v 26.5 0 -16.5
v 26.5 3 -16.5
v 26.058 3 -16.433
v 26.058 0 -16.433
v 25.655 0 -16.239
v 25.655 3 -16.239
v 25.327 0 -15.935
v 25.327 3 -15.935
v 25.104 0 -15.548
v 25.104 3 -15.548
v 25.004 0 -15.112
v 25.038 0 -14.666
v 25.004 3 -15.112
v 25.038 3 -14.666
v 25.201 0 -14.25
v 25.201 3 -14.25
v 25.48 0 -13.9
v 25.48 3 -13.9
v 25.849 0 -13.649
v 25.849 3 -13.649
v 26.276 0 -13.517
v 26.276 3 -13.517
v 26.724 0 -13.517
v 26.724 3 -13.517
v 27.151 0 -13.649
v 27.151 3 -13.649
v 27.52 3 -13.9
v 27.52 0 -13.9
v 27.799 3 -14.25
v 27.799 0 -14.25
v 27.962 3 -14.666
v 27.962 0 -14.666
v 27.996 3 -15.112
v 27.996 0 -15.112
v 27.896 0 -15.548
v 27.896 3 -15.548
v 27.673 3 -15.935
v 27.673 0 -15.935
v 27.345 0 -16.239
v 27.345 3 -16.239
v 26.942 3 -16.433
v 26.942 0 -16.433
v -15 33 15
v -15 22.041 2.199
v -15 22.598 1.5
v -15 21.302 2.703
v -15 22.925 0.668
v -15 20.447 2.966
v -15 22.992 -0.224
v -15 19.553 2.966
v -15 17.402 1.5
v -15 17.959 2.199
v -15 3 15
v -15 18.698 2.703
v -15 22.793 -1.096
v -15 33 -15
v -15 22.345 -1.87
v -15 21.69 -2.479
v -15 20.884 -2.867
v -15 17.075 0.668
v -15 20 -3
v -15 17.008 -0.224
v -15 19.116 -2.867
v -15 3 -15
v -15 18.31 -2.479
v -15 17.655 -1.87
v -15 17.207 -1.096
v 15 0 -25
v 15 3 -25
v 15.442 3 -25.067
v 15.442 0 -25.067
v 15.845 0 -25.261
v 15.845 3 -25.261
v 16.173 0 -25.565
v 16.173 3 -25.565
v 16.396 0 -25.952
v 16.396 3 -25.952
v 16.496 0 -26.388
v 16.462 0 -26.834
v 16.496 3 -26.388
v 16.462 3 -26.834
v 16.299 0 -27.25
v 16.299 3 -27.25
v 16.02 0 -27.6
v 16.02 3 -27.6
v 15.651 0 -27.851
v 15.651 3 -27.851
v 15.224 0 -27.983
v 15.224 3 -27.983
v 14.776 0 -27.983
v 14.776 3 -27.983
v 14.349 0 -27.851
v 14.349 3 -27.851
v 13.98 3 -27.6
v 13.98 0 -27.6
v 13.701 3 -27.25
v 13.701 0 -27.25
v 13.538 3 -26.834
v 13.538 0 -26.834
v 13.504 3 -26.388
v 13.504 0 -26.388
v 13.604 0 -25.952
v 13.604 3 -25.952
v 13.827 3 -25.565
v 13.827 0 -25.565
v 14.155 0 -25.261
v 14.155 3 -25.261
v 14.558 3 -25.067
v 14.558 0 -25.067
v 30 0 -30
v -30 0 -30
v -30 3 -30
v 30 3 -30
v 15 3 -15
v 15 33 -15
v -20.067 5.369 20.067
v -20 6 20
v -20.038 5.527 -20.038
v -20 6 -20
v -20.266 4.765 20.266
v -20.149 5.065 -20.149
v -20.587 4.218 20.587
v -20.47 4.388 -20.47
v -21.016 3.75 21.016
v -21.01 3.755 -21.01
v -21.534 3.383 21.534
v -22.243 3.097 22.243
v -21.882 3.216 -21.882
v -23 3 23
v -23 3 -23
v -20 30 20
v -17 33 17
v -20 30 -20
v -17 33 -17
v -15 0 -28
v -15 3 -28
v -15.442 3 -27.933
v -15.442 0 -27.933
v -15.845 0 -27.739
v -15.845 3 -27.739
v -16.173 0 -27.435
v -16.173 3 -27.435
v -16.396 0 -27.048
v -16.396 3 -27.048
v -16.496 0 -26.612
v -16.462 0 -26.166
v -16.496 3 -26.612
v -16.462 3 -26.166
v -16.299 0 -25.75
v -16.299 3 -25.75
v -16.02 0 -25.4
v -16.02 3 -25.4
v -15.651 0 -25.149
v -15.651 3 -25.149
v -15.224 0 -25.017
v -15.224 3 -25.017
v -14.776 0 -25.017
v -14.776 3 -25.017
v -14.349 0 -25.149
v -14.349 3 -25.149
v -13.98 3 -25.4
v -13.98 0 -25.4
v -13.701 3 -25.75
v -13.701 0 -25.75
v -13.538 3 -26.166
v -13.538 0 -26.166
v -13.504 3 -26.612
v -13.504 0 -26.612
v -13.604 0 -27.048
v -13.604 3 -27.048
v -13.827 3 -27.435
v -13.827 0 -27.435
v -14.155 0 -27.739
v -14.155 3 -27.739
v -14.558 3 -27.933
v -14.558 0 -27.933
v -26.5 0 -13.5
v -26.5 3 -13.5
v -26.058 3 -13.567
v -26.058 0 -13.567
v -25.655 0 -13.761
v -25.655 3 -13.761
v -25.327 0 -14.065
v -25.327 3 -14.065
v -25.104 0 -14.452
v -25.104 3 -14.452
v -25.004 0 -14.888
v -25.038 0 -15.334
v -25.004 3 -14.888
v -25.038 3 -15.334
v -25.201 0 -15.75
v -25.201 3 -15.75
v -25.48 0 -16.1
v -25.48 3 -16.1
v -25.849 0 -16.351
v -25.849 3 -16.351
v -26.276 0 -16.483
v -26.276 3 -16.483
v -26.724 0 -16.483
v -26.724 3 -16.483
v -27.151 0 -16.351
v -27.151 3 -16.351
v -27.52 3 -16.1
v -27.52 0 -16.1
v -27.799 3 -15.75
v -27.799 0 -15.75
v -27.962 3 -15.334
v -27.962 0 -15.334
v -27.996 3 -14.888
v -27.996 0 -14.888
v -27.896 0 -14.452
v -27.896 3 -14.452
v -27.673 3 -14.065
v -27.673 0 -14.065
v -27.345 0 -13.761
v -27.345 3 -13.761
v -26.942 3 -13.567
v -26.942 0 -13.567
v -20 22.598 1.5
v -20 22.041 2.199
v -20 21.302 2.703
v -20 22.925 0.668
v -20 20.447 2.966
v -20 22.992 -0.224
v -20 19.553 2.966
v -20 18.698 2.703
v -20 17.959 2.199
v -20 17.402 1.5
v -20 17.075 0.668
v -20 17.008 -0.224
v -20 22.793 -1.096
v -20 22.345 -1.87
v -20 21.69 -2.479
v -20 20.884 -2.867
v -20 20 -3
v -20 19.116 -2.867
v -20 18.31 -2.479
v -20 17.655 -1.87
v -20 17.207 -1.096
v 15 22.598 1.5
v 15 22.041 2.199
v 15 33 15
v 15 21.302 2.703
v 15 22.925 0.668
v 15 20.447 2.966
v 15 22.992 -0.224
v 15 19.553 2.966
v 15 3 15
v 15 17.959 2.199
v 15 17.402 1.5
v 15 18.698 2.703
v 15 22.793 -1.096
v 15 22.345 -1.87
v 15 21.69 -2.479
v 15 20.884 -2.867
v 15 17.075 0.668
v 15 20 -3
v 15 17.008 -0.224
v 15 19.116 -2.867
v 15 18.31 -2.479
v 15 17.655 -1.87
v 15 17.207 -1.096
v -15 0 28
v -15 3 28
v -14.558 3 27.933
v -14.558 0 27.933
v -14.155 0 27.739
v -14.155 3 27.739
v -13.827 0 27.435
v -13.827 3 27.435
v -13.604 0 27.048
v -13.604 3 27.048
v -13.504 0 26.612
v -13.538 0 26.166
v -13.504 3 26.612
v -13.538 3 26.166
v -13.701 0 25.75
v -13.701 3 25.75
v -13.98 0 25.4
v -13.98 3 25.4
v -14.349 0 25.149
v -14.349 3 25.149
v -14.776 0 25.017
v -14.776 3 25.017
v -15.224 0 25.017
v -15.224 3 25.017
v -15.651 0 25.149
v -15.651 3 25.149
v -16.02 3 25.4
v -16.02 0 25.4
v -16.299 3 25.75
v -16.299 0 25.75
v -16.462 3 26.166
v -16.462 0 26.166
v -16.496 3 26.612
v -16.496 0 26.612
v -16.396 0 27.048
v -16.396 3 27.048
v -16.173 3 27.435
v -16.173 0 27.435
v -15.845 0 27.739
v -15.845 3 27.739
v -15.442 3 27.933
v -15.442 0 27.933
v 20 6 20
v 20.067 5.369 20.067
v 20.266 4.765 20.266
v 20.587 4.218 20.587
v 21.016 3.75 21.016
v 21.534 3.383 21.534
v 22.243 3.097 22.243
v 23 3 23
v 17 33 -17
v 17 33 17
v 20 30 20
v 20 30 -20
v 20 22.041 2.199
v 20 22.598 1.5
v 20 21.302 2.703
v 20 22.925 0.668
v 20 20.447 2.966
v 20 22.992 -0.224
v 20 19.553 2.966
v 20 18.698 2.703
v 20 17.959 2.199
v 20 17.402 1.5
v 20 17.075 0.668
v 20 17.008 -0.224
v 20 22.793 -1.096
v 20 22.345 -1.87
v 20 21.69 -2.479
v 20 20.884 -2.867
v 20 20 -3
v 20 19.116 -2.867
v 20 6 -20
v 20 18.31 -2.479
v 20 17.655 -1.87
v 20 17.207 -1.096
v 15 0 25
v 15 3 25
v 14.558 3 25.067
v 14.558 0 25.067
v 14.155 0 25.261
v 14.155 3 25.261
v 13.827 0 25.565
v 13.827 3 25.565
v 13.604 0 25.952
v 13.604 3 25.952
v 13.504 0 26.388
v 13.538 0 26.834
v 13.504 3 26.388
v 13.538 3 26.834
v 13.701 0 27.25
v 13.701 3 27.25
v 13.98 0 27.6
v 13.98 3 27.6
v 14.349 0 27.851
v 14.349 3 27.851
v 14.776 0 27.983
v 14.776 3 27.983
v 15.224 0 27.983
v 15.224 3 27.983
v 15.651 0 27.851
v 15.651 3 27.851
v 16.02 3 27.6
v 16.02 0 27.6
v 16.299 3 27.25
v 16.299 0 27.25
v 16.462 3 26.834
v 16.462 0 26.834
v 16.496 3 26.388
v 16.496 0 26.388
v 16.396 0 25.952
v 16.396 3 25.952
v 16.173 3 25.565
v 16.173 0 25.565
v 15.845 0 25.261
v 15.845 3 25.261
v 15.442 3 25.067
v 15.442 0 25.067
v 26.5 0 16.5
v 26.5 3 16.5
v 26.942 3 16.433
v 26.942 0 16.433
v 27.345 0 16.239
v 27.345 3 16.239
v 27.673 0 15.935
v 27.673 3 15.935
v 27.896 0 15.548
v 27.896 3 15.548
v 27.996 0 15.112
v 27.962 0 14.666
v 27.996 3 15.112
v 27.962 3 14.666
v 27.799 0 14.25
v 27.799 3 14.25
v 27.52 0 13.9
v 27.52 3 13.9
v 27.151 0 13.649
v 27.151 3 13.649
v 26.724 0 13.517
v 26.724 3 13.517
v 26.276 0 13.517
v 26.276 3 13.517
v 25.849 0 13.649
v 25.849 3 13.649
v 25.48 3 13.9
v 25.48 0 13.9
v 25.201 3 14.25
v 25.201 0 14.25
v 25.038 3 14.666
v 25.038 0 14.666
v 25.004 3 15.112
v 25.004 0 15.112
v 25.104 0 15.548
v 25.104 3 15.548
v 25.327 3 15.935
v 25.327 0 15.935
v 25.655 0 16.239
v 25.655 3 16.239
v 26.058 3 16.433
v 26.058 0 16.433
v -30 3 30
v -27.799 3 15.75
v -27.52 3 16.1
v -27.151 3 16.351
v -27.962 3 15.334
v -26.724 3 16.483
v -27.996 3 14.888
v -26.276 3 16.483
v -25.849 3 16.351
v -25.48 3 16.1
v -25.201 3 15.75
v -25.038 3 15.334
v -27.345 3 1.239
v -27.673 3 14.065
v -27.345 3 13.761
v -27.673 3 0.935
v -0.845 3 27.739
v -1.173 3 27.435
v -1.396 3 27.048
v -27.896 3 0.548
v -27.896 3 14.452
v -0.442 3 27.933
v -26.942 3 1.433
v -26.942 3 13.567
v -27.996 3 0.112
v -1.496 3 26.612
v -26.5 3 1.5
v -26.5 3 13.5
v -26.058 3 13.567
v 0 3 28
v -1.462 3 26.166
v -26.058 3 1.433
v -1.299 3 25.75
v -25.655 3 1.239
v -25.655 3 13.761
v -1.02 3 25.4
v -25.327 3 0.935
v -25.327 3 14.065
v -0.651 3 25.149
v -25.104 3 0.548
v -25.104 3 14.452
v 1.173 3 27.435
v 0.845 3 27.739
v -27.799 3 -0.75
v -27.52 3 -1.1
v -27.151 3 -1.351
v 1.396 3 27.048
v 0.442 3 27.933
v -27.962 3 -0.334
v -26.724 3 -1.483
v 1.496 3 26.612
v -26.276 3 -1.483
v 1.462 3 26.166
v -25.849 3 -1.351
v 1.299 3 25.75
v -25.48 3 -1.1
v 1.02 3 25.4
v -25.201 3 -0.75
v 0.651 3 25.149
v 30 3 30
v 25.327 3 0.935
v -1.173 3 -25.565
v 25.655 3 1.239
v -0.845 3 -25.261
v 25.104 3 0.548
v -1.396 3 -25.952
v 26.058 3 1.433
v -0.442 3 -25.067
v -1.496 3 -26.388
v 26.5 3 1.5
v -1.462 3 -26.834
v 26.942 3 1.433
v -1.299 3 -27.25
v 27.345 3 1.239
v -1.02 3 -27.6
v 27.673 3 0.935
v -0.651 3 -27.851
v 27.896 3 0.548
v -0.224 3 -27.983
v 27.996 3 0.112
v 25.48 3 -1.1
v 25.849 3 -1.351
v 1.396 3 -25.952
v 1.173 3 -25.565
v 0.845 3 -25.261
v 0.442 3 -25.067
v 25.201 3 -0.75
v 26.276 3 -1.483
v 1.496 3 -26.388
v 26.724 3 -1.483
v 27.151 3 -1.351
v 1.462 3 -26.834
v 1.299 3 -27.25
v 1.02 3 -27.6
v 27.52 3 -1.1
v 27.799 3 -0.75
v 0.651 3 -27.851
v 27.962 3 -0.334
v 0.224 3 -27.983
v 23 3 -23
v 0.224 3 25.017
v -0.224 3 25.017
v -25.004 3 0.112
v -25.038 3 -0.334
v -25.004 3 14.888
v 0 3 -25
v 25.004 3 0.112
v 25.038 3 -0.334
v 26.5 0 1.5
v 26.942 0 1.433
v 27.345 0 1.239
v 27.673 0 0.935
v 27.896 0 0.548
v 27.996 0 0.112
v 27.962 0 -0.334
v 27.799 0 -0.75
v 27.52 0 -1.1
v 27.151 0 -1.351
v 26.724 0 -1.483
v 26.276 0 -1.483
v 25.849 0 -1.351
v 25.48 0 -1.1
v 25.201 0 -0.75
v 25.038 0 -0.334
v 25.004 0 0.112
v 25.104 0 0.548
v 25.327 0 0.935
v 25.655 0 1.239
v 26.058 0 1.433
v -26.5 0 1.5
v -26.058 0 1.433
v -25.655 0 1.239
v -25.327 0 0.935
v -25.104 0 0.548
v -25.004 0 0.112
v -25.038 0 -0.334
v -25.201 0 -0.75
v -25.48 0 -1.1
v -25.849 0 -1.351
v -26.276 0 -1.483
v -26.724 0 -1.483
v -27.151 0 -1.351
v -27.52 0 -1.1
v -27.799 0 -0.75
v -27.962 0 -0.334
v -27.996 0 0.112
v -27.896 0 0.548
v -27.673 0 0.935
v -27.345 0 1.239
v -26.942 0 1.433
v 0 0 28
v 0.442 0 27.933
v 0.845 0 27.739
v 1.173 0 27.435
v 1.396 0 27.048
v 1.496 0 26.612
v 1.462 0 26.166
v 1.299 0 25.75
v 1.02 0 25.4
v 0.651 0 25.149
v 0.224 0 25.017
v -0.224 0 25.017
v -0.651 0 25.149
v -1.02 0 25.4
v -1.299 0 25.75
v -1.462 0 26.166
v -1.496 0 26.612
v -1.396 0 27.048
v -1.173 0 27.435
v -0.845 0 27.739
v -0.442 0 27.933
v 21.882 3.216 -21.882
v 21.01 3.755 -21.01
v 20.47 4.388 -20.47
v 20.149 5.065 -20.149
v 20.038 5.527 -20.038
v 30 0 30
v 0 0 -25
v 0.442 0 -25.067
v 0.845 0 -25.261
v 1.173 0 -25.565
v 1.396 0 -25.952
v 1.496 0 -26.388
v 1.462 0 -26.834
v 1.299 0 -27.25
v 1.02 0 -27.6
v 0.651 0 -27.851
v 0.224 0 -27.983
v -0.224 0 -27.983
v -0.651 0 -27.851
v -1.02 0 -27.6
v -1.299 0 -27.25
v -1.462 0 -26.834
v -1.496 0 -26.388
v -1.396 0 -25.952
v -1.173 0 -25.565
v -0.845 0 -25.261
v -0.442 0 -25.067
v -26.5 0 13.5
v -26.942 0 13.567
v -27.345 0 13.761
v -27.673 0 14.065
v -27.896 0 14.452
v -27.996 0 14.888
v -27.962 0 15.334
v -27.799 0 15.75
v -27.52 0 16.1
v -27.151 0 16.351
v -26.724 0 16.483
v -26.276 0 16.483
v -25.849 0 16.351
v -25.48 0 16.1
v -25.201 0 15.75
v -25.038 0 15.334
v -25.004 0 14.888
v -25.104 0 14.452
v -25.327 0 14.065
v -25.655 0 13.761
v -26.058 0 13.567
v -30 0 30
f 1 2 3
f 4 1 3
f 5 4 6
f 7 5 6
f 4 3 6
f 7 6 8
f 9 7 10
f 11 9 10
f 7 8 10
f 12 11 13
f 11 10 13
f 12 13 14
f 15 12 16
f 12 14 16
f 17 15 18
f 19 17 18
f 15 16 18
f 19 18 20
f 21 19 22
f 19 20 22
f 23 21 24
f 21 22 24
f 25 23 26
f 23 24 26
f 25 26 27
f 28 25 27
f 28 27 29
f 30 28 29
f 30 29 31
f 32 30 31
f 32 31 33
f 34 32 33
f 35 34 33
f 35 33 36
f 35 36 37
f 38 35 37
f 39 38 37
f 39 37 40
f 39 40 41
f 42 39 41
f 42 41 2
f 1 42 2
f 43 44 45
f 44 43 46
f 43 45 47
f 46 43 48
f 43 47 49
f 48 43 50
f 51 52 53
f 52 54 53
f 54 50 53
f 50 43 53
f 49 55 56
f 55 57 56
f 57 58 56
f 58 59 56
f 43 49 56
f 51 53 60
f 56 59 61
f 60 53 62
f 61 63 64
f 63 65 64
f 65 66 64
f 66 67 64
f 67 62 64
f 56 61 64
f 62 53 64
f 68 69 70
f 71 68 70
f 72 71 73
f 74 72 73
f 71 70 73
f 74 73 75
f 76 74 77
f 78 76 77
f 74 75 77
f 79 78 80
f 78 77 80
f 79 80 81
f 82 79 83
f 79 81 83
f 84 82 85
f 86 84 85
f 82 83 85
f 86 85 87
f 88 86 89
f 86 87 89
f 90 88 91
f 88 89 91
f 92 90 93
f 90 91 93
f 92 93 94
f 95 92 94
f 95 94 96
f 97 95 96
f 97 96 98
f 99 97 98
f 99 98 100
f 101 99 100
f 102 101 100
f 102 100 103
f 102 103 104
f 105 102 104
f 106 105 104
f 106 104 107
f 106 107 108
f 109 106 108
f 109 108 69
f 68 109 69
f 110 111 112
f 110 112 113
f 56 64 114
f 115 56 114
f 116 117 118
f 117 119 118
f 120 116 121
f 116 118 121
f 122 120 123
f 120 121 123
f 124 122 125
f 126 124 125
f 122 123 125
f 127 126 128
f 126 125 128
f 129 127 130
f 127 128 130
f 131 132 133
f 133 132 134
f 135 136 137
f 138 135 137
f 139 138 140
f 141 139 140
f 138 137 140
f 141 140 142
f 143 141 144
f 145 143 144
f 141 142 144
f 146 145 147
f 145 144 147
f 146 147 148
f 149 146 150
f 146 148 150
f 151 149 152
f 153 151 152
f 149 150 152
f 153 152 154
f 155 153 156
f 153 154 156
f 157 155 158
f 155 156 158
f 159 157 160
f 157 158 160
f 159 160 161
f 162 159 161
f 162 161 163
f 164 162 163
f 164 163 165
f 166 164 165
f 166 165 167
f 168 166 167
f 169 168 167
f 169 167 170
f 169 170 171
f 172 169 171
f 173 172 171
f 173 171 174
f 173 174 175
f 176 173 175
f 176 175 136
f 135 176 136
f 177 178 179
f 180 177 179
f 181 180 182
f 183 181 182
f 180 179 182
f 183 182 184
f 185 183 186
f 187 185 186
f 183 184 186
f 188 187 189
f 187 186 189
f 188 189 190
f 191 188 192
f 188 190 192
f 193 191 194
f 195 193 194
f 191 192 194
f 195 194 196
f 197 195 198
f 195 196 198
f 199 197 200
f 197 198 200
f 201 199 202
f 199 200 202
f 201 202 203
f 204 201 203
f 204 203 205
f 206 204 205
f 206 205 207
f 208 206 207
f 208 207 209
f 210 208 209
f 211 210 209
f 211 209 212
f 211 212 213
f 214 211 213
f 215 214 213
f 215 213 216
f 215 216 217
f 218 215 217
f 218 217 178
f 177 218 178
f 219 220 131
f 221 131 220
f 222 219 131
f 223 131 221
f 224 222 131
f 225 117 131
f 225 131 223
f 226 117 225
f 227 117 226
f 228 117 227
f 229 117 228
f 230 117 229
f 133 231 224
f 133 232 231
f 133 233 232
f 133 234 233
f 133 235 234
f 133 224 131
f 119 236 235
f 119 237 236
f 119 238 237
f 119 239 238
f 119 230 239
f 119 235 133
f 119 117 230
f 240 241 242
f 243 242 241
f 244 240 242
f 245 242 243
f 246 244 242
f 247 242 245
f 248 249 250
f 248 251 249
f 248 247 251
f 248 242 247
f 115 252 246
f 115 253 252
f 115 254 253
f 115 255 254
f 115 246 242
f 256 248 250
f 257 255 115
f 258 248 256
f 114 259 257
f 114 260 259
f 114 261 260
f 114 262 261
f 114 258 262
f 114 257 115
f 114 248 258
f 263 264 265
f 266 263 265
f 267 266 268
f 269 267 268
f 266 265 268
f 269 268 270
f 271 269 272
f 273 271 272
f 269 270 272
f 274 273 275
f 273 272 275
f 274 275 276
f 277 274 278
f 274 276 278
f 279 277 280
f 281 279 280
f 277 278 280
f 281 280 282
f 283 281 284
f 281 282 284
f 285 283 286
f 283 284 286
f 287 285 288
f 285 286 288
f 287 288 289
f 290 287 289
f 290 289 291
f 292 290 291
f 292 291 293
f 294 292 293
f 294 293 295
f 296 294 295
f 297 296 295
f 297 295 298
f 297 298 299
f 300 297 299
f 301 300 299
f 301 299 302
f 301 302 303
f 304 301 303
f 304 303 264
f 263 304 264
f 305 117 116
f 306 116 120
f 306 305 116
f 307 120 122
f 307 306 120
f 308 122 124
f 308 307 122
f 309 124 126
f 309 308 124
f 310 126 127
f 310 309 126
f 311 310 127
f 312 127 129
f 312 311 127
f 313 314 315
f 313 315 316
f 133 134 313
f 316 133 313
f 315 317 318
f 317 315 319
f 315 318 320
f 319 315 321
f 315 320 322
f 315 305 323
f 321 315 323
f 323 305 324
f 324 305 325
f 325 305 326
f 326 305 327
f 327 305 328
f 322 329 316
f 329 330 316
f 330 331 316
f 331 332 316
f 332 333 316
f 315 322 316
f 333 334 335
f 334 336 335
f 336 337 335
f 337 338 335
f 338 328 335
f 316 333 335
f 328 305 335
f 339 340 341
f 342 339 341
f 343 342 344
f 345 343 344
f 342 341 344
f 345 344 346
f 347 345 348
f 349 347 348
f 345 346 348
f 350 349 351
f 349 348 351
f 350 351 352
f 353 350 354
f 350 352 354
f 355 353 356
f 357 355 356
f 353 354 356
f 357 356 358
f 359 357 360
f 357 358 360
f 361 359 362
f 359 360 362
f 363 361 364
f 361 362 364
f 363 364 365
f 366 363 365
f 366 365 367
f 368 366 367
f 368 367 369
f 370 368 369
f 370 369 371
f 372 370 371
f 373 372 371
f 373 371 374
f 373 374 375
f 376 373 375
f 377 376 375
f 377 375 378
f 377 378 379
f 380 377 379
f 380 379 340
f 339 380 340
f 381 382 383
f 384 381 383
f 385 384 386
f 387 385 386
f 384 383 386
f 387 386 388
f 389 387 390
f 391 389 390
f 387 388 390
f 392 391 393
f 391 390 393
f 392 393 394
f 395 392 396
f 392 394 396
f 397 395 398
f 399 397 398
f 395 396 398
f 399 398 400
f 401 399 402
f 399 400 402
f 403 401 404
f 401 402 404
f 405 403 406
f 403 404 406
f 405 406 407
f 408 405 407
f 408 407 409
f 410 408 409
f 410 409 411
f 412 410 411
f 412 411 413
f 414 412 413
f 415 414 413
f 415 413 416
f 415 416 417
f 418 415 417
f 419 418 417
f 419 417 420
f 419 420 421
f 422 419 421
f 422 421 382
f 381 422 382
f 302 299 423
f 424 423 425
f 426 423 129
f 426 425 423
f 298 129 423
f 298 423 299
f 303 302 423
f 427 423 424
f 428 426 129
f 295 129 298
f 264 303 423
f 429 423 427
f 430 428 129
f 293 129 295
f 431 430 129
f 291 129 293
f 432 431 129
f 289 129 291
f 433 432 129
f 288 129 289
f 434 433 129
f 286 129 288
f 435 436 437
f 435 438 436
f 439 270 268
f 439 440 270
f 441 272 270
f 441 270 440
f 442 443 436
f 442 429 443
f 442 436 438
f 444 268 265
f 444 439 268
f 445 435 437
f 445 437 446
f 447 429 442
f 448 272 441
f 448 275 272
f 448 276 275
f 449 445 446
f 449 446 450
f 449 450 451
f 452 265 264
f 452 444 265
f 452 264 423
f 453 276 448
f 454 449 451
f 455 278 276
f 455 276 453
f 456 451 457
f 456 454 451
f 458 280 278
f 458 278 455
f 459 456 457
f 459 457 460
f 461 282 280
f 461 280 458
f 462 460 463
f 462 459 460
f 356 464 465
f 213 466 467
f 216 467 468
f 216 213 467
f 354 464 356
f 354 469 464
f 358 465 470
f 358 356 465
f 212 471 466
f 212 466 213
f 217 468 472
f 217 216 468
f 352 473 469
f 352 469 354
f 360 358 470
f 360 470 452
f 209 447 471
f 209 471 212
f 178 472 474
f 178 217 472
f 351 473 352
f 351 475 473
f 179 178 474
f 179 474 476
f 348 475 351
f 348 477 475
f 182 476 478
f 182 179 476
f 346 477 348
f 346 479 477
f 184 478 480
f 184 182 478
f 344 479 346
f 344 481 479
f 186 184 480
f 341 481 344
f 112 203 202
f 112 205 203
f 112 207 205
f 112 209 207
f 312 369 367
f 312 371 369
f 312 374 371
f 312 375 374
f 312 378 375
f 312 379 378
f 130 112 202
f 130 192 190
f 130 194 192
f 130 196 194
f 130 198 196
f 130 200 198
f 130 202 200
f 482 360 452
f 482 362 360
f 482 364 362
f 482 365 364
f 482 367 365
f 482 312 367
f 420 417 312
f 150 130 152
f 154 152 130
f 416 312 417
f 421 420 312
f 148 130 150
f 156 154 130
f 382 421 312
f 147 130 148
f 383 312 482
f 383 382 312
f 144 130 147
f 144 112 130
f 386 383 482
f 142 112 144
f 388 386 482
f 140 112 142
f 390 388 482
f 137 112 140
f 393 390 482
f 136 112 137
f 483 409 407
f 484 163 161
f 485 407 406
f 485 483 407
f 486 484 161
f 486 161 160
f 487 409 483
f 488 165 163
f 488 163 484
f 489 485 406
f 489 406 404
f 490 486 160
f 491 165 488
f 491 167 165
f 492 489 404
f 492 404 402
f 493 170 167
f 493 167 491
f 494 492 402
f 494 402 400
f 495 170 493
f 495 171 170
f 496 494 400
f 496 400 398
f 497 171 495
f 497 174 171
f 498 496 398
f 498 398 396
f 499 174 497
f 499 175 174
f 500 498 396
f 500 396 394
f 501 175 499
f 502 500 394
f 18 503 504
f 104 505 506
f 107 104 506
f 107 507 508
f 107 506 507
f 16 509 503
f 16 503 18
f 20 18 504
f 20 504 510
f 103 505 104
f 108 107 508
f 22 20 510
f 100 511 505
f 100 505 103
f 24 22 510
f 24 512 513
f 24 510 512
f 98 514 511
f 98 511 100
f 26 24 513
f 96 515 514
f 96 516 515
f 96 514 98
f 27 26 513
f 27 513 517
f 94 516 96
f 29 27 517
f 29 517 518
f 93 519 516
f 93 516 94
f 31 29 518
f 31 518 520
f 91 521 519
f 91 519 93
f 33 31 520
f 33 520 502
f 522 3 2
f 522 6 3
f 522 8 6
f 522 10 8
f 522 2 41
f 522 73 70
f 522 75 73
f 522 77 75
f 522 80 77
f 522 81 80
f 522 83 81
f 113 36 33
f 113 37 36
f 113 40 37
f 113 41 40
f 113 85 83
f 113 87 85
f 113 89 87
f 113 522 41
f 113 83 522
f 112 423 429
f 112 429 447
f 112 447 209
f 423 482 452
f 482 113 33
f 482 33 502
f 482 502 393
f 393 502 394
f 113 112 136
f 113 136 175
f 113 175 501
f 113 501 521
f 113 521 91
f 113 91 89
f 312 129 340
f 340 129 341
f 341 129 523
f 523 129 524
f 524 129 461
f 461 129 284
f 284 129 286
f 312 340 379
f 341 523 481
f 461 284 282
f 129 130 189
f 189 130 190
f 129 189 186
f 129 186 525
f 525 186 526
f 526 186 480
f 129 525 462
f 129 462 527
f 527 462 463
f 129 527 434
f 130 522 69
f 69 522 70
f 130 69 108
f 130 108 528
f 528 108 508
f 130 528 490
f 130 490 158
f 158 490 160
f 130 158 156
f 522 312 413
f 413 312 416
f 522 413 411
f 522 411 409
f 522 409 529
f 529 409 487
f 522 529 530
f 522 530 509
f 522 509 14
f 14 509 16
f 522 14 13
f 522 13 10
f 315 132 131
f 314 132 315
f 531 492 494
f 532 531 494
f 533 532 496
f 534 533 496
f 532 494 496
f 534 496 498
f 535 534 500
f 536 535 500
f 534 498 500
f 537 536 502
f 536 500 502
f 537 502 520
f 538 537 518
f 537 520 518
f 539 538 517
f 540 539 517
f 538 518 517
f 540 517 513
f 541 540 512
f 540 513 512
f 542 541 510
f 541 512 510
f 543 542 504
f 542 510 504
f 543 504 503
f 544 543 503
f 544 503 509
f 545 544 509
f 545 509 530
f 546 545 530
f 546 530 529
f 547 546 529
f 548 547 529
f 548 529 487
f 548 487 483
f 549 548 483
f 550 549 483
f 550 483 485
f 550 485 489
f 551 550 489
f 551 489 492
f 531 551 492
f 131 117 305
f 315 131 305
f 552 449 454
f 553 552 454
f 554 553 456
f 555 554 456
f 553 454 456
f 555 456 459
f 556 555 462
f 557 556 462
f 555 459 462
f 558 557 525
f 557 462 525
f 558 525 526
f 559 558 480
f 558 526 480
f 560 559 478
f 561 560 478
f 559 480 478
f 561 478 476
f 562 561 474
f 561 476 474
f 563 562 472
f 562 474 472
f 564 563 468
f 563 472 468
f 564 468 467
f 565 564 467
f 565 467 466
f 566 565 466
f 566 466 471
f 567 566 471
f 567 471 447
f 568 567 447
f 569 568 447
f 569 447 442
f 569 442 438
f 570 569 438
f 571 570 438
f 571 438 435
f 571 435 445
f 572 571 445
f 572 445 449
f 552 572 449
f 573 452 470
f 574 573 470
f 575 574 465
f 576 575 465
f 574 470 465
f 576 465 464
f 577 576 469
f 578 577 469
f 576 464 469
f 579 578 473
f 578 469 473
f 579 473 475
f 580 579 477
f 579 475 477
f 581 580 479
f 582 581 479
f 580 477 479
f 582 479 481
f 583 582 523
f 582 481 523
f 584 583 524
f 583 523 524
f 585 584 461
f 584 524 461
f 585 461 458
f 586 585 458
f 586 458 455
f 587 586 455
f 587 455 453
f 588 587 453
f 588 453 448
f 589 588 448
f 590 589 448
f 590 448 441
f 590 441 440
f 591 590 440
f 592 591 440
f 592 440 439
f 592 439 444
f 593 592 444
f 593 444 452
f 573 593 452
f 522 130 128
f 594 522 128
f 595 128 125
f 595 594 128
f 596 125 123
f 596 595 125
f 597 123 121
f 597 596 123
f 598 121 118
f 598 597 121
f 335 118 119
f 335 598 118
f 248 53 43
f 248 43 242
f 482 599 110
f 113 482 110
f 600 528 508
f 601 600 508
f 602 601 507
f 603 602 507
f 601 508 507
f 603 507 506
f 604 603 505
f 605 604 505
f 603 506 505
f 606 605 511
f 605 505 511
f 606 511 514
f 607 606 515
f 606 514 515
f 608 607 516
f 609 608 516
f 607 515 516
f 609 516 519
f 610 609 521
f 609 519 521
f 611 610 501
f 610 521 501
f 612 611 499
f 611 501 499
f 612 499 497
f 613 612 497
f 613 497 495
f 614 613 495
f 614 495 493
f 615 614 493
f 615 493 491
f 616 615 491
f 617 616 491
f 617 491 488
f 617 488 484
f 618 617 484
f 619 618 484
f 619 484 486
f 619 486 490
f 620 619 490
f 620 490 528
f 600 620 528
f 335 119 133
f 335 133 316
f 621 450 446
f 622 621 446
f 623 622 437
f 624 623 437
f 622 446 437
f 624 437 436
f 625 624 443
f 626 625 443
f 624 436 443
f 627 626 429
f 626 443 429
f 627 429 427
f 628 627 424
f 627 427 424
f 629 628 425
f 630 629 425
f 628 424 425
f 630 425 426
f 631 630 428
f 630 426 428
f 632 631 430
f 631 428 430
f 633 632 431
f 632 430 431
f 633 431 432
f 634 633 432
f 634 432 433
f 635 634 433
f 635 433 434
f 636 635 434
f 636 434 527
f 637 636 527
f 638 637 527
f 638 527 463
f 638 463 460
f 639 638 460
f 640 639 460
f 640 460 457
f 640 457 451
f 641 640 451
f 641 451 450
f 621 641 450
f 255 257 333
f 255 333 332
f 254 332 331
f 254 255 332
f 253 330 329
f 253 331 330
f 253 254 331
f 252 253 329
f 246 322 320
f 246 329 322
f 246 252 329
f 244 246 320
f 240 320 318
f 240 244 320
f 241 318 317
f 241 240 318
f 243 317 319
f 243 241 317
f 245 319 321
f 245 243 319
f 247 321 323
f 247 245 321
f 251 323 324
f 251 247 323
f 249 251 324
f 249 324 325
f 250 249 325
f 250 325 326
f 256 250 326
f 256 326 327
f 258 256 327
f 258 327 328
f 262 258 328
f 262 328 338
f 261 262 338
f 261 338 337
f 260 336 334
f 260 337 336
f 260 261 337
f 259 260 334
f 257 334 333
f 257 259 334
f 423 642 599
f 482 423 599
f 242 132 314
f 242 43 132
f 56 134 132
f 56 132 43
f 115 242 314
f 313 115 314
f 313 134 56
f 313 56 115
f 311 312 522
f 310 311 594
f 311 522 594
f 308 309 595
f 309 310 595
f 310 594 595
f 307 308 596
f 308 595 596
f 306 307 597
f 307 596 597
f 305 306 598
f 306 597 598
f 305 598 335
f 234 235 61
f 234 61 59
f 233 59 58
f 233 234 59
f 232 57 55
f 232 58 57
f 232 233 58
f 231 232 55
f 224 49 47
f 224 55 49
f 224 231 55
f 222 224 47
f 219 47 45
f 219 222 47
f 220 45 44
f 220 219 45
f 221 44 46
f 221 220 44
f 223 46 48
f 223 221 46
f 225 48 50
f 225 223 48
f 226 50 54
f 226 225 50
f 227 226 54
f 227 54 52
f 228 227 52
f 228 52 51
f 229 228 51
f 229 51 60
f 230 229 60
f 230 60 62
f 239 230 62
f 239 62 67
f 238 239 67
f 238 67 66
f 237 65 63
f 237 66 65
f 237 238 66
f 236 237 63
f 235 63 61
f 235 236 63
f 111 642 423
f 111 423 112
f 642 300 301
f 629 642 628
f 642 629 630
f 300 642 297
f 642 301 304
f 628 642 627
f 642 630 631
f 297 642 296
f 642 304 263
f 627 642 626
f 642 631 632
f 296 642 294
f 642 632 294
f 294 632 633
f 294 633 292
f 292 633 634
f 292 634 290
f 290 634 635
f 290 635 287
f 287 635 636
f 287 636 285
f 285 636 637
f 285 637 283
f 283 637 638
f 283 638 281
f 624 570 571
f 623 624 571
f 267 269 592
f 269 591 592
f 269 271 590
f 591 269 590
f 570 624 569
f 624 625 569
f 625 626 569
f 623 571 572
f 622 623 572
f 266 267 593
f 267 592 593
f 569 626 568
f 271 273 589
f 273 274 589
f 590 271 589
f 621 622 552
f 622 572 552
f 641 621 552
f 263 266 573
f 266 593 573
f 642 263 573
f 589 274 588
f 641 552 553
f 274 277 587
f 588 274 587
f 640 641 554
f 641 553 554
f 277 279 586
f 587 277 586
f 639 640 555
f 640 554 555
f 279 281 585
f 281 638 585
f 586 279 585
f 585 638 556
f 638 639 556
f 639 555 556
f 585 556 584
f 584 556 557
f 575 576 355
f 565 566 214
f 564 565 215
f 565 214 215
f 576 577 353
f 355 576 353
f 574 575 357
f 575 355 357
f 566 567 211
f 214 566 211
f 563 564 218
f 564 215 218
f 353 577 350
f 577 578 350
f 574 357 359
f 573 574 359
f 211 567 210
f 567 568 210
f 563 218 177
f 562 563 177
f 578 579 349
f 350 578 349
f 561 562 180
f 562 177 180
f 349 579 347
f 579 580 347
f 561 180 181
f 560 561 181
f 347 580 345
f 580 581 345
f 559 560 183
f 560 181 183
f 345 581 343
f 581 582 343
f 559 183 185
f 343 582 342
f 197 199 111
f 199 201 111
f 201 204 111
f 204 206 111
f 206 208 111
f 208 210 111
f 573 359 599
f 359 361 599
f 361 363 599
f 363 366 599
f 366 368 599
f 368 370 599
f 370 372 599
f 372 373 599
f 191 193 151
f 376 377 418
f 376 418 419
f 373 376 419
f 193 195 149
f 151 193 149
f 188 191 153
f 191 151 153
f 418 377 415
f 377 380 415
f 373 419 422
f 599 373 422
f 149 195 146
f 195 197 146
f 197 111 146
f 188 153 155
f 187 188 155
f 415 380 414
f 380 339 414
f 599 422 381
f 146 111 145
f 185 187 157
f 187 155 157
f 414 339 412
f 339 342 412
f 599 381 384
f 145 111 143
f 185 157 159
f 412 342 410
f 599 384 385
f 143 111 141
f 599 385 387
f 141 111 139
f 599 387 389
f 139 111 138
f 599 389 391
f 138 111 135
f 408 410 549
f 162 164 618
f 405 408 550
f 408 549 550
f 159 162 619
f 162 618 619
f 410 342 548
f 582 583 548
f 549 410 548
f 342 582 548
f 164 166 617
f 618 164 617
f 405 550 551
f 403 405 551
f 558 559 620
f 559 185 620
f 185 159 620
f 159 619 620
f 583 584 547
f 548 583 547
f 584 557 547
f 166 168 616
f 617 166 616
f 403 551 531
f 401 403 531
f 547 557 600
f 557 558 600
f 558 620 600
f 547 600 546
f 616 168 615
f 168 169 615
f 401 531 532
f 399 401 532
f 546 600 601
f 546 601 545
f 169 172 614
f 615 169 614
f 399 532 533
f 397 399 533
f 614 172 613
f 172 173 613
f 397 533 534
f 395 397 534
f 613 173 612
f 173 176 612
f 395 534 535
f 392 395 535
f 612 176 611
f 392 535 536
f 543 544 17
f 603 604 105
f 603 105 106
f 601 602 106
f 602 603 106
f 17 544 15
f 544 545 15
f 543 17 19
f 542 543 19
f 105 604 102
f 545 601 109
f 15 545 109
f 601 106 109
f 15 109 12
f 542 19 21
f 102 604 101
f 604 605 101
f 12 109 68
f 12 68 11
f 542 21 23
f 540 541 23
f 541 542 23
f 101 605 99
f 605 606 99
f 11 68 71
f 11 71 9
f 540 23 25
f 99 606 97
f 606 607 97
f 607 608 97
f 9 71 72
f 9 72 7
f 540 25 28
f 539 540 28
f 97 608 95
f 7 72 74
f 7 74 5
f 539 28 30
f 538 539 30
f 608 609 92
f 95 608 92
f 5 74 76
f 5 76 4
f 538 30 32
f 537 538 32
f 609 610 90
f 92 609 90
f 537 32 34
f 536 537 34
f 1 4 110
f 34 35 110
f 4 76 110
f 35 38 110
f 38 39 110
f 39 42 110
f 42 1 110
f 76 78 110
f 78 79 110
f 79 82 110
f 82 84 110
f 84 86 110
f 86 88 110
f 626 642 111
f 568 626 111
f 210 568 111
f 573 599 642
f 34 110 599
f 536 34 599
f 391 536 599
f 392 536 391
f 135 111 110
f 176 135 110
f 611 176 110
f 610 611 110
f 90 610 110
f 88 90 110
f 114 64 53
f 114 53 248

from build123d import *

# Parameters (mm, degrees)
CROQUIS1_W                 = 60
CROQUIS1_H                 = 60
SALIENTE_EXTRUIR1_DEPTH    = 3
CROQUIS2_W                 = 40
CROQUIS2_H                 = 40
CROQUIS2_W_2               = 30
CROQUIS2_H_2               = 30
SALIENTE_EXTRUIR2_DEPTH    = 30
CHAFL_N1_SIZE              = 3
REDONDEO1_R                = 3
CROQUIS3_R                 = 1.5
CORTAR_EXTRUIR1_DEPTH      = 30
CORTAR_EXTRUIR2_DEPTH      = 54.749418602
CORTAR_EXTRUIR2_DEPTH_BACK = 54.749418602
CROQUIS4_R                 = 3


with BuildPart() as part:
    # Croquis1 → Saliente-Extruir1 (new body)
    with BuildSketch(Plane(origin=(0, 0, 0), x_dir=(1, 0, 0), z_dir=(0, 1, 0))):
        Rectangle(CROQUIS1_W, CROQUIS1_H)
    extrude(amount=SALIENTE_EXTRUIR1_DEPTH)

    # Croquis2 → Saliente-Extruir2 (add)
    with BuildSketch(Plane(origin=(0, 3, 0), x_dir=(1, 0, 0), z_dir=(0, 1, 0))):
        Rectangle(CROQUIS2_W, CROQUIS2_H)
        Rectangle(CROQUIS2_W_2, CROQUIS2_H_2, mode=Mode.SUBTRACT)
    extrude(amount=SALIENTE_EXTRUIR2_DEPTH)

    # Chaflán1
    chafl_n1_edges = [part.edges().sort_by_distance(p)[0] for p in [
        (0, 33, 20),
        (20, 33, 0),
        (0, 33, -20),
        (-20, 33, 0),
    ]]
    chamfer(chafl_n1_edges, length=CHAFL_N1_SIZE)

    # Redondeo1
    redondeo1_edges = [part.edges().sort_by_distance(p)[0] for p in [
        (0, 3, 20),
        (20, 3, 0),
        (0, 3, -20),
        (-20, 3, 0),
    ]]
    fillet(redondeo1_edges, radius=REDONDEO1_R)

    # Croquis3 → Cortar-Extruir1 (cut)
    with BuildSketch(Plane(origin=(0, 3, 0), x_dir=(1, 0, 0), z_dir=(0, 1, 0))):
        with Locations(Location((0, 26.5, 0), (0, 0, 270))):
            Circle(CROQUIS3_R)
        with Locations(Location((15, 26.5, 0), (0, 0, 270))):
            Circle(CROQUIS3_R)
        with Locations(Location((-15, 26.5, 0), (0, 0, 90))):
            Circle(CROQUIS3_R)
        with Locations(Location((26.5, 15, 0), (0, 0, 90))):
            Circle(CROQUIS3_R)
        with Locations(Location((26.5, 0, 0), (0, 0, 270))):
            Circle(CROQUIS3_R)
        with Locations(Location((26.5, -15, 0), (0, 0, 270))):
            Circle(CROQUIS3_R)
        with Locations(Location((15, -26.5, 0), (0, 0, 90))):
            Circle(CROQUIS3_R)
        with Locations(Location((0, -26.5, 0), (0, 0, 270))):
            Circle(CROQUIS3_R)
        with Locations(Location((-15, -26.5, 0), (0, 0, 270))):
            Circle(CROQUIS3_R)
        with Locations(Location((-26.5, -15, 0), (0, 0, 90))):
            Circle(CROQUIS3_R)
        with Locations(Location((-26.5, 0, 0), (0, 0, 270))):
            Circle(CROQUIS3_R)
        with Locations(Location((-26.5, 15, 0), (0, 0, 270))):
            Circle(CROQUIS3_R)
    extrude(amount=-CORTAR_EXTRUIR1_DEPTH, mode=Mode.SUBTRACT)

    # Croquis4 → Cortar-Extruir2 (cut, two sides: drawn at the far end of the back side and taken through both)
    with BuildSketch(Plane(origin=(0, 0, 0), x_dir=(0, 0, -1), z_dir=(1, 0, 0)).offset(-CORTAR_EXTRUIR2_DEPTH_BACK)):
        with Locations((0, 20)):
            Circle(CROQUIS4_R)
    extrude(amount=CORTAR_EXTRUIR2_DEPTH + CORTAR_EXTRUIR2_DEPTH_BACK, mode=Mode.SUBTRACT)


solid = part.part
